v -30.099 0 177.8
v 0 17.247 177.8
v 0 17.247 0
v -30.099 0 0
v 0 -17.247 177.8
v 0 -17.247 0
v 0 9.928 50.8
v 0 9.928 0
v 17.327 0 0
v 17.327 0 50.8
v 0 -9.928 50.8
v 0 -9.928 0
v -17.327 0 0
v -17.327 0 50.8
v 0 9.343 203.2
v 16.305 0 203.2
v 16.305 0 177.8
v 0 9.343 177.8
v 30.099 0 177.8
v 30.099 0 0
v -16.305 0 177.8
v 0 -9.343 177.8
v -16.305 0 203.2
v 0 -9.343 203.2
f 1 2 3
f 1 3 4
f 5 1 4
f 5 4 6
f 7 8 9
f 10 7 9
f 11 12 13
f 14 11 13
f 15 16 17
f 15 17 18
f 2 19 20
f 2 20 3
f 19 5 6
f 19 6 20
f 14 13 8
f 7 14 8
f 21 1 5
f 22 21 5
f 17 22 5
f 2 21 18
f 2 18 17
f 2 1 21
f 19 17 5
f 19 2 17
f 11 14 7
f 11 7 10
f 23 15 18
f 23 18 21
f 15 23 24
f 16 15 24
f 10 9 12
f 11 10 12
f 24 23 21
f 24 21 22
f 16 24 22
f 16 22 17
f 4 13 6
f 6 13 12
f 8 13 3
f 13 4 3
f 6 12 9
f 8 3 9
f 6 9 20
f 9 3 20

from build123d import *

# Parameters (mm, degrees)
F1_DEPTH = 50.8
F3_DEPTH = 127
F5_DEPTH = 25.4


with BuildPart() as f1:
    # F0 (on Top) → F1 (new body)
    with BuildSketch(Plane.XY):
        Polygon((-30.099, 0), (-17.3265462716, 0), (0, 9.9280379058), (0, 17.2466), align=None)
        Polygon((0, 17.2466), (0, 9.9280379058), (17.3265462716, 0), (30.099, 0), align=None)
        Polygon((30.099, 0), (17.3265462716, 0), (0, -9.9280379058), (0, -17.2466), align=None)
        Polygon((0, -9.9280379058), (-17.3265462716, 0), (-30.099, 0), (0, -17.2466), align=None)
    extrude(amount=F1_DEPTH)

    # F2 (on face) → F3 (join)
    with BuildSketch(Plane.XY.offset(50.8)):
        Polygon((-30.099, 0), (0, -17.2466), (30.099, 0), (0, 17.2466), align=None)
        Polygon((0, -9.9280379058), (-17.3265462716, 0), (0, 9.9280379058), (17.3265462716, 0), align=None, mode=Mode.SUBTRACT)
        Polygon((0, 9.9280379058), (-17.3265462716, 0), (0, -9.9280379058), (17.3265462716, 0), align=None)
    extrude(amount=F3_DEPTH)

    # F4 (on face) → F5 (join)
    with BuildSketch(Plane.XY.offset(177.8)):
        Polygon((0, 9.3425529383), (-16.3047499733, 0), (0, -9.3425529383), (16.3047499733, 0), align=None)
    extrude(amount=F5_DEPTH)


solid = f1.part
